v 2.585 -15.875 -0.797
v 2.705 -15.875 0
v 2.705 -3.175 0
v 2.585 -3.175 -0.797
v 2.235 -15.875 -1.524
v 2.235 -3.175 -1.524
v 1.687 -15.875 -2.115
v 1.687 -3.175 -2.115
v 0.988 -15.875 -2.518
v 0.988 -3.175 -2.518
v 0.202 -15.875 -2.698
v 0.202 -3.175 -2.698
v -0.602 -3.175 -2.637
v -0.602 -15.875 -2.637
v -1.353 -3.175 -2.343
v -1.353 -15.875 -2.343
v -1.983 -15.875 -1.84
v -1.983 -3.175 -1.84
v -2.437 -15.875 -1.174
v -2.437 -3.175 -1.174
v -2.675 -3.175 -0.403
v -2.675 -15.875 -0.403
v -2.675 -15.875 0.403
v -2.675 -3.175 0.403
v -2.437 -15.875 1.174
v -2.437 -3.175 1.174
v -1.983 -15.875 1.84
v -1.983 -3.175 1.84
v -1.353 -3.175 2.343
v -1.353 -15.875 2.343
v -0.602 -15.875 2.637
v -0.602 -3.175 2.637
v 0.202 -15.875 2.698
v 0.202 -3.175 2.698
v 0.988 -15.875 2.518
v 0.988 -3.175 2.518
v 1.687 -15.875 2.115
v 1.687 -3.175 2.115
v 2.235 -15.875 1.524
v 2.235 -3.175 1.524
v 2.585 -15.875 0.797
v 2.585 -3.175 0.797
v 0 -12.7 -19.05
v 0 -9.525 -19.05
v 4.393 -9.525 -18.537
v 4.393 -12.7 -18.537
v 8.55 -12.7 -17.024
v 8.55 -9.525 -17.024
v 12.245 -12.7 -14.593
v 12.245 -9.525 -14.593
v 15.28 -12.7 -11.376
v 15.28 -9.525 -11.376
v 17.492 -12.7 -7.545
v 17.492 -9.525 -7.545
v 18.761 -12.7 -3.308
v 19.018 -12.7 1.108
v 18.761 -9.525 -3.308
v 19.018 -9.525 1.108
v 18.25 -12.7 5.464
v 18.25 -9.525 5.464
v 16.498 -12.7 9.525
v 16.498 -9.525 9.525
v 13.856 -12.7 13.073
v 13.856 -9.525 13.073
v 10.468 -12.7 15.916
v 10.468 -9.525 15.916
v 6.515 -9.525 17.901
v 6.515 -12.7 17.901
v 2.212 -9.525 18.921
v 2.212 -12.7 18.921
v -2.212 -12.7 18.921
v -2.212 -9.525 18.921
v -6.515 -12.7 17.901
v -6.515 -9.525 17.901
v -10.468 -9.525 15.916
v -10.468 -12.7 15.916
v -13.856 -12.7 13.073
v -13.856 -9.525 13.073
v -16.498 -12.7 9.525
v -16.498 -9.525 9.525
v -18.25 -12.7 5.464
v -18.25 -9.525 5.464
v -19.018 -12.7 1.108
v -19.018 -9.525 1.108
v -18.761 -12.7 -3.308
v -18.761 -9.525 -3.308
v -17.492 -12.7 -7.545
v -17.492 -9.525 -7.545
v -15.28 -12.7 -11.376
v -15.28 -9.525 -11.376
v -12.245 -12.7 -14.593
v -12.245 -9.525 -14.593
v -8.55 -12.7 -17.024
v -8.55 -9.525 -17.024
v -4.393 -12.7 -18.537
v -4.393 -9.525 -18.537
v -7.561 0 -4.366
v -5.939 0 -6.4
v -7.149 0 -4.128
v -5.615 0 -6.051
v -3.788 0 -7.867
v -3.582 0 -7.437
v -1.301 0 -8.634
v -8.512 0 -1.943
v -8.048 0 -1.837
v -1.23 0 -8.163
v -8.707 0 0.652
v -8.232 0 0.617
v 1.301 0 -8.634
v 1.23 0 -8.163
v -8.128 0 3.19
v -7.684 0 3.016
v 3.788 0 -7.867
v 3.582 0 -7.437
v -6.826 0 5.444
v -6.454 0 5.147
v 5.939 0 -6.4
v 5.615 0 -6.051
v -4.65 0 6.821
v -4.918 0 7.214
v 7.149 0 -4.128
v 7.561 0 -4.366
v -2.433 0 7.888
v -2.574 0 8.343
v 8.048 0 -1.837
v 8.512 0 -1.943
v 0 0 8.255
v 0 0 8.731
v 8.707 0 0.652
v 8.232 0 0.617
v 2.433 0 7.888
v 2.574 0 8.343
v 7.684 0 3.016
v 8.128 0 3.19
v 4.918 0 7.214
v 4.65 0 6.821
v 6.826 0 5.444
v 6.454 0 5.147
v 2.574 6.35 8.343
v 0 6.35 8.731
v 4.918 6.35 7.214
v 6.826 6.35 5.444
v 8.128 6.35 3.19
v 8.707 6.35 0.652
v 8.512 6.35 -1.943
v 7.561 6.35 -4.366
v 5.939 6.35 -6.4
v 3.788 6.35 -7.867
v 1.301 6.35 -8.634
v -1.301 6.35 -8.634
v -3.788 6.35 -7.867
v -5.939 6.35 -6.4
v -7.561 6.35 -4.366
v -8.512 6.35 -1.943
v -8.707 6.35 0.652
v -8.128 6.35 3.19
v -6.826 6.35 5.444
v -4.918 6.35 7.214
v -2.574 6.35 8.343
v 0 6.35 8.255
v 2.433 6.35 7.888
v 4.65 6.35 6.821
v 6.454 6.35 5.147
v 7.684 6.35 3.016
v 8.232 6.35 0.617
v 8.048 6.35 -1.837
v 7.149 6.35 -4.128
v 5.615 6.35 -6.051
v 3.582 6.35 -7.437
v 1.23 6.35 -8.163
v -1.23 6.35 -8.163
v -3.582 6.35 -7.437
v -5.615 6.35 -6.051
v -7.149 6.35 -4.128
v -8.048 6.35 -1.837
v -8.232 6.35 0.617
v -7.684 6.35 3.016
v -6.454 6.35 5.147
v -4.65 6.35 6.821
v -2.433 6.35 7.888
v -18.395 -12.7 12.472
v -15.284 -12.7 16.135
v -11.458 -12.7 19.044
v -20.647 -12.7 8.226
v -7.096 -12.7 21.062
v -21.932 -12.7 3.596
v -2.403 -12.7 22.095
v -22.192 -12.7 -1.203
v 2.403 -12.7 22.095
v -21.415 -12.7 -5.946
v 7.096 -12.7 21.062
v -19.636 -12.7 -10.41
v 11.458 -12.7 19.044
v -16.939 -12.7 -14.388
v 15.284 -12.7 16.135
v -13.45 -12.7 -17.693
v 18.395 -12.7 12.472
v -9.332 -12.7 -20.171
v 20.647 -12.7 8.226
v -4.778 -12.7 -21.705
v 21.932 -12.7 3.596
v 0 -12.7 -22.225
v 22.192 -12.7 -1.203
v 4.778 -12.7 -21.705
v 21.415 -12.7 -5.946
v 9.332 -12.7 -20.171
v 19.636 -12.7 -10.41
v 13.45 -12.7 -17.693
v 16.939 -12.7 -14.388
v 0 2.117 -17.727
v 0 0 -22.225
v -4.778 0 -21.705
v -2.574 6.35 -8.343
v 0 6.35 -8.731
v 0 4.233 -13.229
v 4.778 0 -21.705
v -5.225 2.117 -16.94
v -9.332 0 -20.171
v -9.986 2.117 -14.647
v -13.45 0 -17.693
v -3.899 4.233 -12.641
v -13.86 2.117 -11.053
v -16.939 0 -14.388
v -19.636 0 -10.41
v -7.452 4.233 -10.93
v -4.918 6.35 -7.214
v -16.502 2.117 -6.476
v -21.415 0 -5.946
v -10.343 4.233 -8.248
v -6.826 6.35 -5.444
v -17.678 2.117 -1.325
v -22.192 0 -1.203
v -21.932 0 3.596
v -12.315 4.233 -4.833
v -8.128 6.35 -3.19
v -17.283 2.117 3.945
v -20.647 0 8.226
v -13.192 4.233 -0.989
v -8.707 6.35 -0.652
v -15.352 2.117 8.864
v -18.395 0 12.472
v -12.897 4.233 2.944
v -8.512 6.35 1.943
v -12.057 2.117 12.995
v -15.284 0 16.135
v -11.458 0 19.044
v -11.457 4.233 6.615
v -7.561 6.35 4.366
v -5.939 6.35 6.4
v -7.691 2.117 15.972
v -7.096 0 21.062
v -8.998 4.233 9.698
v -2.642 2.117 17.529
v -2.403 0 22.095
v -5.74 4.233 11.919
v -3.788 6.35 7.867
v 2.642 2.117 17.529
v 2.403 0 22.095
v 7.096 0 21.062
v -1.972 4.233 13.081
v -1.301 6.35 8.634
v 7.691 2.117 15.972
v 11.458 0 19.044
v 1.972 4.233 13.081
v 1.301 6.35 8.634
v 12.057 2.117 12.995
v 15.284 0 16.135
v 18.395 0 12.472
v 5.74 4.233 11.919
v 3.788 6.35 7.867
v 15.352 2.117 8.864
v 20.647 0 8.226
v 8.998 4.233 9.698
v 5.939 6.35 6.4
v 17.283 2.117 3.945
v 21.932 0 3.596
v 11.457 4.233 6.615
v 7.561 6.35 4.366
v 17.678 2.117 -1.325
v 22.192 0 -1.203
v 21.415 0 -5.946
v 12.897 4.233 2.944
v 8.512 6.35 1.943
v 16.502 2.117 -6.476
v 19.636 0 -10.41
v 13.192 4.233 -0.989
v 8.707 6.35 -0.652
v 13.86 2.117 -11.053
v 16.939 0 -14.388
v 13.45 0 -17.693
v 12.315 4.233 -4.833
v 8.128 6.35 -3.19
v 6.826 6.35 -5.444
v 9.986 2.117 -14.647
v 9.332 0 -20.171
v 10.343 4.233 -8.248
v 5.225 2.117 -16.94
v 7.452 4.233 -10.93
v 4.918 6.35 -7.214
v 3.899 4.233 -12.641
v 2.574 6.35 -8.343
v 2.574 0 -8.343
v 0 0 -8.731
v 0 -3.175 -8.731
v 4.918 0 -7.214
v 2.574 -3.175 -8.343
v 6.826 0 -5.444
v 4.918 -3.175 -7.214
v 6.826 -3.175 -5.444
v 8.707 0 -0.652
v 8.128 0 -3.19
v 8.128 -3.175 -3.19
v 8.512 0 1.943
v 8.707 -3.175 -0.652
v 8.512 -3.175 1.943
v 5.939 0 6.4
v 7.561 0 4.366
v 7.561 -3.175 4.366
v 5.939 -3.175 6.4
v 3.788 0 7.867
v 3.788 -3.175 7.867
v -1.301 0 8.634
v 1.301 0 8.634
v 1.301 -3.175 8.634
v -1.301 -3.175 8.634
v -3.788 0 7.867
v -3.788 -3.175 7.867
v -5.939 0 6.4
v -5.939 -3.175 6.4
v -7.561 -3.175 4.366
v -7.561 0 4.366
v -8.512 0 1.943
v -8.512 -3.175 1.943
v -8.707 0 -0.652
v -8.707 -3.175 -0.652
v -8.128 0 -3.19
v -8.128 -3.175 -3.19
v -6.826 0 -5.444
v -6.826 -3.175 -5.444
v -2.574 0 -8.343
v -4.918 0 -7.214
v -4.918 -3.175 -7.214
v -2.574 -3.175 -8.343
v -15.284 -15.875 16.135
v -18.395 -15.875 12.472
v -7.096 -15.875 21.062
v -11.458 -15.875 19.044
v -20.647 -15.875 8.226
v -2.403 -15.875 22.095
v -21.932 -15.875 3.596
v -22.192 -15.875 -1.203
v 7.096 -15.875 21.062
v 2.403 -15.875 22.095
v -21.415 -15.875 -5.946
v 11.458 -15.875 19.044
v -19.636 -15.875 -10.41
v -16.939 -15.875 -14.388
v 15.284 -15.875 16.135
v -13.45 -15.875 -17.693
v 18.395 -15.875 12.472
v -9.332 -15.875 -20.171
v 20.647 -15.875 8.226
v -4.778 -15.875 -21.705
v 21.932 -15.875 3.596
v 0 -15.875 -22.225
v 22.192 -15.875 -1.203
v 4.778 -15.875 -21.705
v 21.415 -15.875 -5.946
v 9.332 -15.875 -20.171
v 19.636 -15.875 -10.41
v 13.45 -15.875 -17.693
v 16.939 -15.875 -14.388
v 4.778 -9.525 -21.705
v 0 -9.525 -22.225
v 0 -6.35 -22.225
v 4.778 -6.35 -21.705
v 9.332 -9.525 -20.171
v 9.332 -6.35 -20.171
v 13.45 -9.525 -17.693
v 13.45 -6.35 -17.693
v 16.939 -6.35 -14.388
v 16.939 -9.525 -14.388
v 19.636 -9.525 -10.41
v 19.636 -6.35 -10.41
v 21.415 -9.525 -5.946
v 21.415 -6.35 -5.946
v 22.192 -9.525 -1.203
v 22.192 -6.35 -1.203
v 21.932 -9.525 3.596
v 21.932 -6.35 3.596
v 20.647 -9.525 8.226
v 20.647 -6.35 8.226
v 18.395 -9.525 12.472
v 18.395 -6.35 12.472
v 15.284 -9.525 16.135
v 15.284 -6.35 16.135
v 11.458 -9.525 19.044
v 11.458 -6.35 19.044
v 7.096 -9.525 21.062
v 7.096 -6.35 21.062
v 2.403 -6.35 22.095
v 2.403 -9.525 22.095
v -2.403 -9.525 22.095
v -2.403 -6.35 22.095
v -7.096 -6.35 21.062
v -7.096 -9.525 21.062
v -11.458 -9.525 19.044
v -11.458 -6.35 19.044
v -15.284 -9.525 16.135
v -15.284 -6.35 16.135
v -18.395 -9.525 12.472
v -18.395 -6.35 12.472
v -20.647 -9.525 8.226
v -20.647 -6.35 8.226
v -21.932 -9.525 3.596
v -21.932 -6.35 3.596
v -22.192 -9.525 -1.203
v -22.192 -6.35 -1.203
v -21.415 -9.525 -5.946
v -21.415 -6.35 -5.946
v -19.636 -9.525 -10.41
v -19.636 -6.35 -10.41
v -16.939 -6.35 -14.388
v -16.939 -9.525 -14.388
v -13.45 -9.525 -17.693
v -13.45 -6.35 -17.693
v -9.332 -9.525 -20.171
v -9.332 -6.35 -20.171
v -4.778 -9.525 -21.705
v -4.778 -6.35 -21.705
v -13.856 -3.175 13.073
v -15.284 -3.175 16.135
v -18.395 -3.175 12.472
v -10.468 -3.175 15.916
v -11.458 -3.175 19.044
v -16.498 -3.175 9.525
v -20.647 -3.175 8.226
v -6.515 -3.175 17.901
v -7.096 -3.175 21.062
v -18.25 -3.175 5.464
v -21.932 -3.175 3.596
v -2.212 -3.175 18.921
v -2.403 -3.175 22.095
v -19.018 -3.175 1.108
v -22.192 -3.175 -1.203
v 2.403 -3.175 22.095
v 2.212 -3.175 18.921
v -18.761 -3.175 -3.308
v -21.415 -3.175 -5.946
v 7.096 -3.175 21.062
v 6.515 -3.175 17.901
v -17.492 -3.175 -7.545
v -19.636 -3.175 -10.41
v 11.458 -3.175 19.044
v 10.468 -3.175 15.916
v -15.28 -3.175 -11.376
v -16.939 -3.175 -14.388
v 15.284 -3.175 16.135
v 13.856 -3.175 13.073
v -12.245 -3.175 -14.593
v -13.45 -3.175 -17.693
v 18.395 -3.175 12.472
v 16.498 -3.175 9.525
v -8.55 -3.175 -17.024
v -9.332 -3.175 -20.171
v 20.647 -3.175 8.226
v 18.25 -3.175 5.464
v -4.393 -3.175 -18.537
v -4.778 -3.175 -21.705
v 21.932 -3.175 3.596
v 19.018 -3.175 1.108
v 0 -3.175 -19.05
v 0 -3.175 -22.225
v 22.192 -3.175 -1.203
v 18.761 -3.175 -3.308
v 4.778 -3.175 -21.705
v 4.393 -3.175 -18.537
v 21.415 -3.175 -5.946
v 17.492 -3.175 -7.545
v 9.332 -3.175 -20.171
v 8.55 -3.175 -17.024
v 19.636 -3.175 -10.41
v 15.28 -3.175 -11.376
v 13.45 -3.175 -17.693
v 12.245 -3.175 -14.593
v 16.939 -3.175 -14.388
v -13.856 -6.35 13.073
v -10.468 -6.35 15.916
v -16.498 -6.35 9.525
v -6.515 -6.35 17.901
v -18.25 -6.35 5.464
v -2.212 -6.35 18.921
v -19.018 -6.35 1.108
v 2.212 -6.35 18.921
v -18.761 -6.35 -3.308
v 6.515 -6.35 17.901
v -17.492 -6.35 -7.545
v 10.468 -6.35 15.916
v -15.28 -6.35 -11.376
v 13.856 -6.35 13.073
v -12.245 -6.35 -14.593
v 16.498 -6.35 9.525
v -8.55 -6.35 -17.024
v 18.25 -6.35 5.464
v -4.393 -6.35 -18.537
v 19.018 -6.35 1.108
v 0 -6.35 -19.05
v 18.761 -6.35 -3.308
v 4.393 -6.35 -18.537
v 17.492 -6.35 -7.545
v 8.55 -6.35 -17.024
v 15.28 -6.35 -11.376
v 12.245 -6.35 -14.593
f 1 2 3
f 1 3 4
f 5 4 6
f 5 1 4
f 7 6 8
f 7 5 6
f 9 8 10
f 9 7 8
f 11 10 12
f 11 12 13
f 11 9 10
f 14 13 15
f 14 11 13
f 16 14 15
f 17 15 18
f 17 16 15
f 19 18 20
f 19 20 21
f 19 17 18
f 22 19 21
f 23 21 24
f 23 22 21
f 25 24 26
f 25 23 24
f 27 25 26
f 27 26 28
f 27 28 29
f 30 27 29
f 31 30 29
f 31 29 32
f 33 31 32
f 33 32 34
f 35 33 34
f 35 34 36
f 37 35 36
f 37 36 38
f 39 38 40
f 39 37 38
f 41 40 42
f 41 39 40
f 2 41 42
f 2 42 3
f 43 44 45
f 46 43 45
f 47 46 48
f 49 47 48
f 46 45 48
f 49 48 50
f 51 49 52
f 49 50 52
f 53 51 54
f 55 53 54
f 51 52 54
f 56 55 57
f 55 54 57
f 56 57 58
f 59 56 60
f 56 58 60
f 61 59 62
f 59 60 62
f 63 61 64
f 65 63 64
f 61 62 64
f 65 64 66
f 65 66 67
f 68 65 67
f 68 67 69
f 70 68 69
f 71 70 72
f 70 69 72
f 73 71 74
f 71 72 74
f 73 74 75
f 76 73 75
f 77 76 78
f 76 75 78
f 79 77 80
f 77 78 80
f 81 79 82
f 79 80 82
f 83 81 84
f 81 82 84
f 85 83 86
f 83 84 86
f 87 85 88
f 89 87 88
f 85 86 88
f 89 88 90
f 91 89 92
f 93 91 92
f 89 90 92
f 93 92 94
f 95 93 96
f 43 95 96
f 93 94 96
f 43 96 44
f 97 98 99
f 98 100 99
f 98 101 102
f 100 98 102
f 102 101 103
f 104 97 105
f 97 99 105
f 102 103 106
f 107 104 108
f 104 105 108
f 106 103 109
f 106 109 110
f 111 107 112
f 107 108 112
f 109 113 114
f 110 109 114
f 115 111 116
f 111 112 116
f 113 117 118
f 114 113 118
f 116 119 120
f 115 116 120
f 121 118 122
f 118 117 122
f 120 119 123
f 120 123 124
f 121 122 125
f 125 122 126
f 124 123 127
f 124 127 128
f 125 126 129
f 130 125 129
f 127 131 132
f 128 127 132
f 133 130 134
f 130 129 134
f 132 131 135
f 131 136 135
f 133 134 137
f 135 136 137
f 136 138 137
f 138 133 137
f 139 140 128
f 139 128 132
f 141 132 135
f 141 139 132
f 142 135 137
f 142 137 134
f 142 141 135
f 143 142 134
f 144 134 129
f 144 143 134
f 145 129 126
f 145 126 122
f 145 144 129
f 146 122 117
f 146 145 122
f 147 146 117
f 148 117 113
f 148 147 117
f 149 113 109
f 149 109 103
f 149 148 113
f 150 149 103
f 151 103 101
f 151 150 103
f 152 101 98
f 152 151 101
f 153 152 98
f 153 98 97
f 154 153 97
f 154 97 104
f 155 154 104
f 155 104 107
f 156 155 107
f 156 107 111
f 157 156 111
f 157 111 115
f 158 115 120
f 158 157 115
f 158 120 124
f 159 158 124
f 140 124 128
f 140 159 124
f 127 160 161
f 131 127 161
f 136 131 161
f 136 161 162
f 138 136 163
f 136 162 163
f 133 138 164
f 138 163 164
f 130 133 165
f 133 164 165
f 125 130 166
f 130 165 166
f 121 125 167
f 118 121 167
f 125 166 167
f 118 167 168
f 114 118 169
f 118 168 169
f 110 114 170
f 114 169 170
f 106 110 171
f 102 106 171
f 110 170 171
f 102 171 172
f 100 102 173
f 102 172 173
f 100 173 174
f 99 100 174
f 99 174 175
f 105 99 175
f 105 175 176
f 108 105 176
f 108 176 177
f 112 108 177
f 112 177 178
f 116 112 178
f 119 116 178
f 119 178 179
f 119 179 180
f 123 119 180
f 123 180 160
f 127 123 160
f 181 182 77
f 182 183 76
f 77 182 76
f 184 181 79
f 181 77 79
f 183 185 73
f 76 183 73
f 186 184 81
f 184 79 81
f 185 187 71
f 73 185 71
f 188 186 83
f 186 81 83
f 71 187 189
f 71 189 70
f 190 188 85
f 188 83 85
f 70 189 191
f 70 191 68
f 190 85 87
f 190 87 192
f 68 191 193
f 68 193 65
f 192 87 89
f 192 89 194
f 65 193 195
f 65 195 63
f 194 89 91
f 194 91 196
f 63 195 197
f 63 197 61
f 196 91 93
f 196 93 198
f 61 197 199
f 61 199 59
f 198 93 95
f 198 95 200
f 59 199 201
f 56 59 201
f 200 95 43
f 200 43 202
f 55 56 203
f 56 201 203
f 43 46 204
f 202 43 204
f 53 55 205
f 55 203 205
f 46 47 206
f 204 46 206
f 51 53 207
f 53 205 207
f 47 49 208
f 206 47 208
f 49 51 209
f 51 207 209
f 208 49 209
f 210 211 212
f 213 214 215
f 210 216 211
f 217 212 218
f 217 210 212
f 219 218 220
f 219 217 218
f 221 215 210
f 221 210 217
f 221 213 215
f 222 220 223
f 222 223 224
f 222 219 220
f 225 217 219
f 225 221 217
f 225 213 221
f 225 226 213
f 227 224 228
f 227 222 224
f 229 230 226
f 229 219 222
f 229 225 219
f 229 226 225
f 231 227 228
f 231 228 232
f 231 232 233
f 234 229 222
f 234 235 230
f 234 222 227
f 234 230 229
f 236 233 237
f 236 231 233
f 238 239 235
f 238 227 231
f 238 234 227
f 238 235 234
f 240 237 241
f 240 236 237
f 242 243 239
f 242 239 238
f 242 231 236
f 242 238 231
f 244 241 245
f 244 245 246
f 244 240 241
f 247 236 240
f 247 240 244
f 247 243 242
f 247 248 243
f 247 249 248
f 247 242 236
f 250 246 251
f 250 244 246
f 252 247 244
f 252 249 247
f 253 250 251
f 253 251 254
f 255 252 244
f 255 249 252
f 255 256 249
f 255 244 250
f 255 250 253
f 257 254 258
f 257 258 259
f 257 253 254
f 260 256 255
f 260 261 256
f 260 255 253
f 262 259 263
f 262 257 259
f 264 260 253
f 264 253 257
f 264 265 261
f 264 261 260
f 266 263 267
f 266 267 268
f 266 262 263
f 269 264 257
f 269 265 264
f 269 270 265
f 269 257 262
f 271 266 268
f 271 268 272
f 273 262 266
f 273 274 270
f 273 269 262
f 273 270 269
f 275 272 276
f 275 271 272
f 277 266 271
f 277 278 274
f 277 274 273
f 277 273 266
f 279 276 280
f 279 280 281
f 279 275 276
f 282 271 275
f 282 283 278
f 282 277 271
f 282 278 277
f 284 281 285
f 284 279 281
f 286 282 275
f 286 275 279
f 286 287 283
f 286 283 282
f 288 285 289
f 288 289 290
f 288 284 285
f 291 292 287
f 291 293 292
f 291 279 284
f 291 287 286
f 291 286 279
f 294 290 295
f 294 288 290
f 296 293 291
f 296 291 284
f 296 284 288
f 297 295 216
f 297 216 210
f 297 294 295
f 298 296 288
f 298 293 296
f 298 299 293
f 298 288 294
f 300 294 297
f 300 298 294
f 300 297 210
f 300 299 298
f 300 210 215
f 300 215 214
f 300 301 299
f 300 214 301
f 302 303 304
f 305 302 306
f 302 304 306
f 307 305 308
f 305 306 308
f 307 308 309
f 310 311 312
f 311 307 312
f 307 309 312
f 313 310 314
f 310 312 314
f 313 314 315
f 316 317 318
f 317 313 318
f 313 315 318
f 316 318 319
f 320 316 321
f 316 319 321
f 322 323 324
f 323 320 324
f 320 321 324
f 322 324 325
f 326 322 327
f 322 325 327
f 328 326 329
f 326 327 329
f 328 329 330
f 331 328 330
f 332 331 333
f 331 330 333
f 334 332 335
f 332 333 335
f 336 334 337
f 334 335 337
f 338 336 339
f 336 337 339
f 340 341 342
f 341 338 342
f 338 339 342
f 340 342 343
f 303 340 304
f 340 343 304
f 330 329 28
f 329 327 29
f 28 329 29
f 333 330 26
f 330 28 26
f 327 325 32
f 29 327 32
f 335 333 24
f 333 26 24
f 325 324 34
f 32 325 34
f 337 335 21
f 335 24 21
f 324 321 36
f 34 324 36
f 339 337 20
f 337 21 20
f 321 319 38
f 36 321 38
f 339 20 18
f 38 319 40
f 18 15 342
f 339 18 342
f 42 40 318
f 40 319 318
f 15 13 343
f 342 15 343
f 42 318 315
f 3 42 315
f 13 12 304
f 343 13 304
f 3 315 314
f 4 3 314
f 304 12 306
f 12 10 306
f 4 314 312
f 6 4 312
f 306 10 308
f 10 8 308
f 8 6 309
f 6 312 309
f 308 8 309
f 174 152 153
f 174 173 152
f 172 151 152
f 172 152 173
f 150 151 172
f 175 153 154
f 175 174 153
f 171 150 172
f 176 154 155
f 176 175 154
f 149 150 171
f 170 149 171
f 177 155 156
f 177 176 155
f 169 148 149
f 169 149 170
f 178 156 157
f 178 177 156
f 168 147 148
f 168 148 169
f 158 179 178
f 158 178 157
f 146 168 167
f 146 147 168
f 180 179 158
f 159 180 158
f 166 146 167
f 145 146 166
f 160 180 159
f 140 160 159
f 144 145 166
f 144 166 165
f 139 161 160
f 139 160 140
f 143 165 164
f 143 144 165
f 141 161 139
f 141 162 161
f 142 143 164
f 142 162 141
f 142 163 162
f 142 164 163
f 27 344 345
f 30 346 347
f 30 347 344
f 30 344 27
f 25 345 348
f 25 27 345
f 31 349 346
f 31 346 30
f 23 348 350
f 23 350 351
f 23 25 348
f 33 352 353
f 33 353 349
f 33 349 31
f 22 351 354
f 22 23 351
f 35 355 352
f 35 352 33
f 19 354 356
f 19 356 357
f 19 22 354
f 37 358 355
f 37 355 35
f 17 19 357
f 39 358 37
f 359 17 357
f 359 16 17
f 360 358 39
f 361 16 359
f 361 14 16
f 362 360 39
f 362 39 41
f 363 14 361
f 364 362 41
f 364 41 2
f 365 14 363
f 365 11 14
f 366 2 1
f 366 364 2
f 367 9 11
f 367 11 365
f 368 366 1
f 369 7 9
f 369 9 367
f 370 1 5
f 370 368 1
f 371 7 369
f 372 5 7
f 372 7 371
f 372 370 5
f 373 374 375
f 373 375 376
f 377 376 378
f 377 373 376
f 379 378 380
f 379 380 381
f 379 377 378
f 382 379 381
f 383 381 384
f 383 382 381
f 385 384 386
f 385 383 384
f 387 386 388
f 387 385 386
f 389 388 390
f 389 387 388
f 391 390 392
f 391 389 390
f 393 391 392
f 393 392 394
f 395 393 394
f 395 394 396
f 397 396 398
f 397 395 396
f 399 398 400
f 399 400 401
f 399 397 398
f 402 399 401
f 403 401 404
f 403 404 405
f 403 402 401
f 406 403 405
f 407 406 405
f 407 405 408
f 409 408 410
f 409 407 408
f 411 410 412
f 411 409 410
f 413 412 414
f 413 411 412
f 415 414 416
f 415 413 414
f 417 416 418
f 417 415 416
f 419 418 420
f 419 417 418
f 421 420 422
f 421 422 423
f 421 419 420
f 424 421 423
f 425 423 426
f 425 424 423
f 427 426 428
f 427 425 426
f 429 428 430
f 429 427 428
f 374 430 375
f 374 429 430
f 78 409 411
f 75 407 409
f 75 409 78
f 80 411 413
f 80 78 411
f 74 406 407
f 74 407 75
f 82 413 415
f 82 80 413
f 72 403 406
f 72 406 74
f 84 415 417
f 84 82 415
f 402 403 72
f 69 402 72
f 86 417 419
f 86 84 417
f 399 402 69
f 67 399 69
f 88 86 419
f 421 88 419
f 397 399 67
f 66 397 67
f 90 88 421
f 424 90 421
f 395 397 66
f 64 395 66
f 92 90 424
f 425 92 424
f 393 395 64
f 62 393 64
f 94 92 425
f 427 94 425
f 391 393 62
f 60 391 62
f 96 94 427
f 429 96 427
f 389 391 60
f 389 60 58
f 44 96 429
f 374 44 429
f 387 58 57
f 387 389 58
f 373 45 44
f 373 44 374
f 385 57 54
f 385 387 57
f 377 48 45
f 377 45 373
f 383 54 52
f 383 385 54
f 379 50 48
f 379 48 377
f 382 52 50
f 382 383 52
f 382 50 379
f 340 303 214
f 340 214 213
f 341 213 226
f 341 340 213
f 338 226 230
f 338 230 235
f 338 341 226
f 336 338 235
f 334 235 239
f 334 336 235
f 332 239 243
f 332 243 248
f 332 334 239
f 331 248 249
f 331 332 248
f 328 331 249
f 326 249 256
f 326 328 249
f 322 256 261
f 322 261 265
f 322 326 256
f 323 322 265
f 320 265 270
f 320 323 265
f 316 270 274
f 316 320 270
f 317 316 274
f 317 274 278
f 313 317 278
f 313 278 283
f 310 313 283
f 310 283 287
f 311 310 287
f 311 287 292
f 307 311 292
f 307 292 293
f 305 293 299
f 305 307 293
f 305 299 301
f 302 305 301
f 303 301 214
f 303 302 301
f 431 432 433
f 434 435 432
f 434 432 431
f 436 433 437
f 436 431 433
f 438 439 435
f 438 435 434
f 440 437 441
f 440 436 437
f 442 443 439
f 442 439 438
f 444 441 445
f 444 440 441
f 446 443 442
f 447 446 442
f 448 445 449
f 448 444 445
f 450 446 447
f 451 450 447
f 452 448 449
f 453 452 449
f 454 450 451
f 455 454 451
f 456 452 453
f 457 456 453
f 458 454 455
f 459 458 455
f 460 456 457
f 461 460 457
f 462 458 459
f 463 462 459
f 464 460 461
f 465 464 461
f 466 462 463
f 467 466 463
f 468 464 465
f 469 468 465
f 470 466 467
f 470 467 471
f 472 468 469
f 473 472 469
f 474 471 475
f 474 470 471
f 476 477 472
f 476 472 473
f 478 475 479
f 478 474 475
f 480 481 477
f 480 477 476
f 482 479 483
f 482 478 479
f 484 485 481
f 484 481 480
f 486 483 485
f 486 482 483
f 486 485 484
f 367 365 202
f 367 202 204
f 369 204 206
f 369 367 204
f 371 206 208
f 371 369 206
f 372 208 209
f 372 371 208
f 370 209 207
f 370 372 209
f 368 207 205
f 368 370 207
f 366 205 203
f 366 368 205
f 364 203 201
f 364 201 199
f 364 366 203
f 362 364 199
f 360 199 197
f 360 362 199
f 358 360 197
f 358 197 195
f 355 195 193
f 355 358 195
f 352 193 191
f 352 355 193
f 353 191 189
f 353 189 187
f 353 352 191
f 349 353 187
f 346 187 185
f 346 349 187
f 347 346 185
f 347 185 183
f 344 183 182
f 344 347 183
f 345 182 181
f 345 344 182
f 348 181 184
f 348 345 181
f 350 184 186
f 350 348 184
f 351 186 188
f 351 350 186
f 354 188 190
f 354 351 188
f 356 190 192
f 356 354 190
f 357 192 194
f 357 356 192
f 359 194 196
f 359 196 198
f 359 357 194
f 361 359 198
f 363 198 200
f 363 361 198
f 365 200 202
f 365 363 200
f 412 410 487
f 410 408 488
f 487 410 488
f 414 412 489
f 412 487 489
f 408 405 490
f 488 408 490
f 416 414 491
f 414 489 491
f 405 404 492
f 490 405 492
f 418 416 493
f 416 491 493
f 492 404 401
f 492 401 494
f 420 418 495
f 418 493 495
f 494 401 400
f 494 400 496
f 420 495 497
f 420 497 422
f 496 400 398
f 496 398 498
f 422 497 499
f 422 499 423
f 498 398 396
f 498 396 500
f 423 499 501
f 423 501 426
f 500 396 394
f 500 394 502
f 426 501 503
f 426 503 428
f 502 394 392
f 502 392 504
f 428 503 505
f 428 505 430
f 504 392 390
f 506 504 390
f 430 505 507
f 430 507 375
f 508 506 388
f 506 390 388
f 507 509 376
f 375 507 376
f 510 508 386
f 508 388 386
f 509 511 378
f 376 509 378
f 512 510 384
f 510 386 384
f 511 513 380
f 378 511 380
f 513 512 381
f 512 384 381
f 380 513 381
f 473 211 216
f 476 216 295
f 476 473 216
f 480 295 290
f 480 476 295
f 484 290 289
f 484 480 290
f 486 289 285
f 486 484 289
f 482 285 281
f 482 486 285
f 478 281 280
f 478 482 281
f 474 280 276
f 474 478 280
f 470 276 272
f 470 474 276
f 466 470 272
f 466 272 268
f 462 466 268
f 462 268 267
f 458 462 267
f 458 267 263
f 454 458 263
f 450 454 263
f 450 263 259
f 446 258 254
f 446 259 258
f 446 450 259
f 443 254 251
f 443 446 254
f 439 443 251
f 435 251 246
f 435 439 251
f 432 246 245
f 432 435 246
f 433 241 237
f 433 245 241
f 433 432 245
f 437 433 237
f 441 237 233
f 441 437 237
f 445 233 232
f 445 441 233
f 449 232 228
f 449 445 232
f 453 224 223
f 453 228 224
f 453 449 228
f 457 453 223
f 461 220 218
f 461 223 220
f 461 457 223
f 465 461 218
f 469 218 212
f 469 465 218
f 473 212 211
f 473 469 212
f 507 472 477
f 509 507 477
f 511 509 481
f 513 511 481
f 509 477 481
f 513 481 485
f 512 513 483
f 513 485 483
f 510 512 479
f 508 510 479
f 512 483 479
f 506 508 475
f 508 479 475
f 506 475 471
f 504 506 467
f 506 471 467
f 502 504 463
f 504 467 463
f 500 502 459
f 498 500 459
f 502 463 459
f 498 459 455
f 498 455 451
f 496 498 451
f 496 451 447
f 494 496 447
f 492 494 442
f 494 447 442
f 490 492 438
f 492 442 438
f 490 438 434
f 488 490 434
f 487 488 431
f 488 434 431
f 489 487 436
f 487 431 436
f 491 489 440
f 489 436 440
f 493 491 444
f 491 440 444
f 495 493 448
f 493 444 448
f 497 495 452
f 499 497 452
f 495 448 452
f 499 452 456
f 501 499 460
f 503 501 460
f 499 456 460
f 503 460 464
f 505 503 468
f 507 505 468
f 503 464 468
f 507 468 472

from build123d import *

# Parameters (mm, degrees)
BOSS_EXTRUDE1_START             = 3.175
SKETCH2_R                       = 22.225
SKETCH2_R_2                     = 8.73125
BOSS_EXTRUDE1_DEPTH             = 3.175
SKETCH3_R                       = 19.05
BOSS_EXTRUDE2_DEPTH             = 3.175
BOSS_EXTRUDE3_START             = 3.175
SKETCH4_R                       = 22.225
BOSS_EXTRUDE3_DEPTH             = 3.175
SKETCH5_R                       = 19.05
BOSS_EXTRUDE4_DEPTH             = 3.175
BOSS_EXTRUDE5_START             = 3.175
SKETCH6_R                       = 22.225
BOSS_EXTRUDE5_DEPTH             = 3.175
SKETCH7_R                       = 8.73125
BOSS_EXTRUDE6_DEPTH             = 6.35
SKETCH10_R                      = 8.255
CUT_EXTRUDE1_DEPTH              = 9.525
F_1_4_28_START                  = -15.875
F_1_4_28_TAPPED_HOLE1_OUTLINE_R = 2.7051
F_1_4_28_TAPPED_HOLE1_DEPTH     = 12.7


# Read off the part's stored shape, not the designer's step: 1/4-28 Tapped Hole1
with BuildPart() as part:
    # Sketch1 → Revolve1 (revolve)
    with BuildSketch(Plane.XY, mode=Mode.PRIVATE) as revolve1_sk:
        Polygon((8.73125, 0), (22.225, 0), (8.73125, 6.35), align=None)
    revolve(revolve1_sk.sketch.rotate(Axis((0, 0, 0), (0, 1, 0)), 90), axis=Axis((0, 0, 0), (0, 1, 0)))

    # Sketch2 → Boss-Extrude1 (add)
    with BuildSketch(Plane.XZ.offset(BOSS_EXTRUDE1_START)):
        with Locations(Location((0, 0, 0), (0, 0, 270))):
            Circle(SKETCH2_R)
        with Locations(Location((0, 0, 0), (0, 0, 270))):
            Circle(SKETCH2_R_2, mode=Mode.SUBTRACT)
    extrude(amount=-BOSS_EXTRUDE1_DEPTH)

    # Sketch3 → Boss-Extrude2 (add)
    with BuildSketch(Plane.XZ.offset(3.175)):
        with Locations(Location((0, 0, 0), (0, 0, 270))):
            Circle(SKETCH3_R)
    extrude(amount=BOSS_EXTRUDE2_DEPTH)

    # Sketch4 → Boss-Extrude3 (add)
    with BuildSketch(Plane.XZ.offset(6.35).offset(BOSS_EXTRUDE3_START)):
        with Locations(Location((0, 0, 0), (0, 0, 270))):
            Circle(SKETCH4_R)
    extrude(amount=-BOSS_EXTRUDE3_DEPTH)

    # Sketch5 → Boss-Extrude4 (add)
    with BuildSketch(Plane.XZ.offset(9.525)):
        with Locations(Location((0, 0, 0), (0, 0, 270))):
            Circle(SKETCH5_R)
    extrude(amount=BOSS_EXTRUDE4_DEPTH)

    # Sketch6 → Boss-Extrude5 (add)
    with BuildSketch(Plane.XZ.offset(12.7).offset(BOSS_EXTRUDE5_START)):
        with Locations(Location((0, 0, 0), (0, 0, 270))):
            Circle(SKETCH6_R)
    extrude(amount=-BOSS_EXTRUDE5_DEPTH)

    # 1/4-28 Tapped Hole1 outline → 1/4-28 Tapped Hole1 (cut)
    with BuildSketch(Plane(origin=(0, 0, 0), x_dir=(1, 0, 0), z_dir=(0, 1, 0)).offset(F_1_4_28_START)):
        Circle(F_1_4_28_TAPPED_HOLE1_OUTLINE_R)
    extrude(amount=F_1_4_28_TAPPED_HOLE1_DEPTH, mode=Mode.SUBTRACT)


with BuildPart() as body_2:
    # Sketch7 → Boss-Extrude6 (new body)
    with BuildSketch(Plane(origin=(0, 6.35, 0), x_dir=(1, 0, 0), z_dir=(0, 1, 0))):
        with Locations(Location((0, 0, 0), (0, 0, 270))):
            Circle(SKETCH7_R)
    extrude(amount=-BOSS_EXTRUDE6_DEPTH)

    # Sketch10 → Cut-Extrude1 (cut)
    with BuildSketch(Plane(origin=(0, 6.35, 0), x_dir=(1, 0, 0), z_dir=(0, 1, 0))):
        with Locations(Location((0, 0, 0), (0, 0, 270))):
            Circle(SKETCH10_R)
    extrude(amount=-CUT_EXTRUDE1_DEPTH, mode=Mode.SUBTRACT)


solid = Compound([part.part, body_2.part])
